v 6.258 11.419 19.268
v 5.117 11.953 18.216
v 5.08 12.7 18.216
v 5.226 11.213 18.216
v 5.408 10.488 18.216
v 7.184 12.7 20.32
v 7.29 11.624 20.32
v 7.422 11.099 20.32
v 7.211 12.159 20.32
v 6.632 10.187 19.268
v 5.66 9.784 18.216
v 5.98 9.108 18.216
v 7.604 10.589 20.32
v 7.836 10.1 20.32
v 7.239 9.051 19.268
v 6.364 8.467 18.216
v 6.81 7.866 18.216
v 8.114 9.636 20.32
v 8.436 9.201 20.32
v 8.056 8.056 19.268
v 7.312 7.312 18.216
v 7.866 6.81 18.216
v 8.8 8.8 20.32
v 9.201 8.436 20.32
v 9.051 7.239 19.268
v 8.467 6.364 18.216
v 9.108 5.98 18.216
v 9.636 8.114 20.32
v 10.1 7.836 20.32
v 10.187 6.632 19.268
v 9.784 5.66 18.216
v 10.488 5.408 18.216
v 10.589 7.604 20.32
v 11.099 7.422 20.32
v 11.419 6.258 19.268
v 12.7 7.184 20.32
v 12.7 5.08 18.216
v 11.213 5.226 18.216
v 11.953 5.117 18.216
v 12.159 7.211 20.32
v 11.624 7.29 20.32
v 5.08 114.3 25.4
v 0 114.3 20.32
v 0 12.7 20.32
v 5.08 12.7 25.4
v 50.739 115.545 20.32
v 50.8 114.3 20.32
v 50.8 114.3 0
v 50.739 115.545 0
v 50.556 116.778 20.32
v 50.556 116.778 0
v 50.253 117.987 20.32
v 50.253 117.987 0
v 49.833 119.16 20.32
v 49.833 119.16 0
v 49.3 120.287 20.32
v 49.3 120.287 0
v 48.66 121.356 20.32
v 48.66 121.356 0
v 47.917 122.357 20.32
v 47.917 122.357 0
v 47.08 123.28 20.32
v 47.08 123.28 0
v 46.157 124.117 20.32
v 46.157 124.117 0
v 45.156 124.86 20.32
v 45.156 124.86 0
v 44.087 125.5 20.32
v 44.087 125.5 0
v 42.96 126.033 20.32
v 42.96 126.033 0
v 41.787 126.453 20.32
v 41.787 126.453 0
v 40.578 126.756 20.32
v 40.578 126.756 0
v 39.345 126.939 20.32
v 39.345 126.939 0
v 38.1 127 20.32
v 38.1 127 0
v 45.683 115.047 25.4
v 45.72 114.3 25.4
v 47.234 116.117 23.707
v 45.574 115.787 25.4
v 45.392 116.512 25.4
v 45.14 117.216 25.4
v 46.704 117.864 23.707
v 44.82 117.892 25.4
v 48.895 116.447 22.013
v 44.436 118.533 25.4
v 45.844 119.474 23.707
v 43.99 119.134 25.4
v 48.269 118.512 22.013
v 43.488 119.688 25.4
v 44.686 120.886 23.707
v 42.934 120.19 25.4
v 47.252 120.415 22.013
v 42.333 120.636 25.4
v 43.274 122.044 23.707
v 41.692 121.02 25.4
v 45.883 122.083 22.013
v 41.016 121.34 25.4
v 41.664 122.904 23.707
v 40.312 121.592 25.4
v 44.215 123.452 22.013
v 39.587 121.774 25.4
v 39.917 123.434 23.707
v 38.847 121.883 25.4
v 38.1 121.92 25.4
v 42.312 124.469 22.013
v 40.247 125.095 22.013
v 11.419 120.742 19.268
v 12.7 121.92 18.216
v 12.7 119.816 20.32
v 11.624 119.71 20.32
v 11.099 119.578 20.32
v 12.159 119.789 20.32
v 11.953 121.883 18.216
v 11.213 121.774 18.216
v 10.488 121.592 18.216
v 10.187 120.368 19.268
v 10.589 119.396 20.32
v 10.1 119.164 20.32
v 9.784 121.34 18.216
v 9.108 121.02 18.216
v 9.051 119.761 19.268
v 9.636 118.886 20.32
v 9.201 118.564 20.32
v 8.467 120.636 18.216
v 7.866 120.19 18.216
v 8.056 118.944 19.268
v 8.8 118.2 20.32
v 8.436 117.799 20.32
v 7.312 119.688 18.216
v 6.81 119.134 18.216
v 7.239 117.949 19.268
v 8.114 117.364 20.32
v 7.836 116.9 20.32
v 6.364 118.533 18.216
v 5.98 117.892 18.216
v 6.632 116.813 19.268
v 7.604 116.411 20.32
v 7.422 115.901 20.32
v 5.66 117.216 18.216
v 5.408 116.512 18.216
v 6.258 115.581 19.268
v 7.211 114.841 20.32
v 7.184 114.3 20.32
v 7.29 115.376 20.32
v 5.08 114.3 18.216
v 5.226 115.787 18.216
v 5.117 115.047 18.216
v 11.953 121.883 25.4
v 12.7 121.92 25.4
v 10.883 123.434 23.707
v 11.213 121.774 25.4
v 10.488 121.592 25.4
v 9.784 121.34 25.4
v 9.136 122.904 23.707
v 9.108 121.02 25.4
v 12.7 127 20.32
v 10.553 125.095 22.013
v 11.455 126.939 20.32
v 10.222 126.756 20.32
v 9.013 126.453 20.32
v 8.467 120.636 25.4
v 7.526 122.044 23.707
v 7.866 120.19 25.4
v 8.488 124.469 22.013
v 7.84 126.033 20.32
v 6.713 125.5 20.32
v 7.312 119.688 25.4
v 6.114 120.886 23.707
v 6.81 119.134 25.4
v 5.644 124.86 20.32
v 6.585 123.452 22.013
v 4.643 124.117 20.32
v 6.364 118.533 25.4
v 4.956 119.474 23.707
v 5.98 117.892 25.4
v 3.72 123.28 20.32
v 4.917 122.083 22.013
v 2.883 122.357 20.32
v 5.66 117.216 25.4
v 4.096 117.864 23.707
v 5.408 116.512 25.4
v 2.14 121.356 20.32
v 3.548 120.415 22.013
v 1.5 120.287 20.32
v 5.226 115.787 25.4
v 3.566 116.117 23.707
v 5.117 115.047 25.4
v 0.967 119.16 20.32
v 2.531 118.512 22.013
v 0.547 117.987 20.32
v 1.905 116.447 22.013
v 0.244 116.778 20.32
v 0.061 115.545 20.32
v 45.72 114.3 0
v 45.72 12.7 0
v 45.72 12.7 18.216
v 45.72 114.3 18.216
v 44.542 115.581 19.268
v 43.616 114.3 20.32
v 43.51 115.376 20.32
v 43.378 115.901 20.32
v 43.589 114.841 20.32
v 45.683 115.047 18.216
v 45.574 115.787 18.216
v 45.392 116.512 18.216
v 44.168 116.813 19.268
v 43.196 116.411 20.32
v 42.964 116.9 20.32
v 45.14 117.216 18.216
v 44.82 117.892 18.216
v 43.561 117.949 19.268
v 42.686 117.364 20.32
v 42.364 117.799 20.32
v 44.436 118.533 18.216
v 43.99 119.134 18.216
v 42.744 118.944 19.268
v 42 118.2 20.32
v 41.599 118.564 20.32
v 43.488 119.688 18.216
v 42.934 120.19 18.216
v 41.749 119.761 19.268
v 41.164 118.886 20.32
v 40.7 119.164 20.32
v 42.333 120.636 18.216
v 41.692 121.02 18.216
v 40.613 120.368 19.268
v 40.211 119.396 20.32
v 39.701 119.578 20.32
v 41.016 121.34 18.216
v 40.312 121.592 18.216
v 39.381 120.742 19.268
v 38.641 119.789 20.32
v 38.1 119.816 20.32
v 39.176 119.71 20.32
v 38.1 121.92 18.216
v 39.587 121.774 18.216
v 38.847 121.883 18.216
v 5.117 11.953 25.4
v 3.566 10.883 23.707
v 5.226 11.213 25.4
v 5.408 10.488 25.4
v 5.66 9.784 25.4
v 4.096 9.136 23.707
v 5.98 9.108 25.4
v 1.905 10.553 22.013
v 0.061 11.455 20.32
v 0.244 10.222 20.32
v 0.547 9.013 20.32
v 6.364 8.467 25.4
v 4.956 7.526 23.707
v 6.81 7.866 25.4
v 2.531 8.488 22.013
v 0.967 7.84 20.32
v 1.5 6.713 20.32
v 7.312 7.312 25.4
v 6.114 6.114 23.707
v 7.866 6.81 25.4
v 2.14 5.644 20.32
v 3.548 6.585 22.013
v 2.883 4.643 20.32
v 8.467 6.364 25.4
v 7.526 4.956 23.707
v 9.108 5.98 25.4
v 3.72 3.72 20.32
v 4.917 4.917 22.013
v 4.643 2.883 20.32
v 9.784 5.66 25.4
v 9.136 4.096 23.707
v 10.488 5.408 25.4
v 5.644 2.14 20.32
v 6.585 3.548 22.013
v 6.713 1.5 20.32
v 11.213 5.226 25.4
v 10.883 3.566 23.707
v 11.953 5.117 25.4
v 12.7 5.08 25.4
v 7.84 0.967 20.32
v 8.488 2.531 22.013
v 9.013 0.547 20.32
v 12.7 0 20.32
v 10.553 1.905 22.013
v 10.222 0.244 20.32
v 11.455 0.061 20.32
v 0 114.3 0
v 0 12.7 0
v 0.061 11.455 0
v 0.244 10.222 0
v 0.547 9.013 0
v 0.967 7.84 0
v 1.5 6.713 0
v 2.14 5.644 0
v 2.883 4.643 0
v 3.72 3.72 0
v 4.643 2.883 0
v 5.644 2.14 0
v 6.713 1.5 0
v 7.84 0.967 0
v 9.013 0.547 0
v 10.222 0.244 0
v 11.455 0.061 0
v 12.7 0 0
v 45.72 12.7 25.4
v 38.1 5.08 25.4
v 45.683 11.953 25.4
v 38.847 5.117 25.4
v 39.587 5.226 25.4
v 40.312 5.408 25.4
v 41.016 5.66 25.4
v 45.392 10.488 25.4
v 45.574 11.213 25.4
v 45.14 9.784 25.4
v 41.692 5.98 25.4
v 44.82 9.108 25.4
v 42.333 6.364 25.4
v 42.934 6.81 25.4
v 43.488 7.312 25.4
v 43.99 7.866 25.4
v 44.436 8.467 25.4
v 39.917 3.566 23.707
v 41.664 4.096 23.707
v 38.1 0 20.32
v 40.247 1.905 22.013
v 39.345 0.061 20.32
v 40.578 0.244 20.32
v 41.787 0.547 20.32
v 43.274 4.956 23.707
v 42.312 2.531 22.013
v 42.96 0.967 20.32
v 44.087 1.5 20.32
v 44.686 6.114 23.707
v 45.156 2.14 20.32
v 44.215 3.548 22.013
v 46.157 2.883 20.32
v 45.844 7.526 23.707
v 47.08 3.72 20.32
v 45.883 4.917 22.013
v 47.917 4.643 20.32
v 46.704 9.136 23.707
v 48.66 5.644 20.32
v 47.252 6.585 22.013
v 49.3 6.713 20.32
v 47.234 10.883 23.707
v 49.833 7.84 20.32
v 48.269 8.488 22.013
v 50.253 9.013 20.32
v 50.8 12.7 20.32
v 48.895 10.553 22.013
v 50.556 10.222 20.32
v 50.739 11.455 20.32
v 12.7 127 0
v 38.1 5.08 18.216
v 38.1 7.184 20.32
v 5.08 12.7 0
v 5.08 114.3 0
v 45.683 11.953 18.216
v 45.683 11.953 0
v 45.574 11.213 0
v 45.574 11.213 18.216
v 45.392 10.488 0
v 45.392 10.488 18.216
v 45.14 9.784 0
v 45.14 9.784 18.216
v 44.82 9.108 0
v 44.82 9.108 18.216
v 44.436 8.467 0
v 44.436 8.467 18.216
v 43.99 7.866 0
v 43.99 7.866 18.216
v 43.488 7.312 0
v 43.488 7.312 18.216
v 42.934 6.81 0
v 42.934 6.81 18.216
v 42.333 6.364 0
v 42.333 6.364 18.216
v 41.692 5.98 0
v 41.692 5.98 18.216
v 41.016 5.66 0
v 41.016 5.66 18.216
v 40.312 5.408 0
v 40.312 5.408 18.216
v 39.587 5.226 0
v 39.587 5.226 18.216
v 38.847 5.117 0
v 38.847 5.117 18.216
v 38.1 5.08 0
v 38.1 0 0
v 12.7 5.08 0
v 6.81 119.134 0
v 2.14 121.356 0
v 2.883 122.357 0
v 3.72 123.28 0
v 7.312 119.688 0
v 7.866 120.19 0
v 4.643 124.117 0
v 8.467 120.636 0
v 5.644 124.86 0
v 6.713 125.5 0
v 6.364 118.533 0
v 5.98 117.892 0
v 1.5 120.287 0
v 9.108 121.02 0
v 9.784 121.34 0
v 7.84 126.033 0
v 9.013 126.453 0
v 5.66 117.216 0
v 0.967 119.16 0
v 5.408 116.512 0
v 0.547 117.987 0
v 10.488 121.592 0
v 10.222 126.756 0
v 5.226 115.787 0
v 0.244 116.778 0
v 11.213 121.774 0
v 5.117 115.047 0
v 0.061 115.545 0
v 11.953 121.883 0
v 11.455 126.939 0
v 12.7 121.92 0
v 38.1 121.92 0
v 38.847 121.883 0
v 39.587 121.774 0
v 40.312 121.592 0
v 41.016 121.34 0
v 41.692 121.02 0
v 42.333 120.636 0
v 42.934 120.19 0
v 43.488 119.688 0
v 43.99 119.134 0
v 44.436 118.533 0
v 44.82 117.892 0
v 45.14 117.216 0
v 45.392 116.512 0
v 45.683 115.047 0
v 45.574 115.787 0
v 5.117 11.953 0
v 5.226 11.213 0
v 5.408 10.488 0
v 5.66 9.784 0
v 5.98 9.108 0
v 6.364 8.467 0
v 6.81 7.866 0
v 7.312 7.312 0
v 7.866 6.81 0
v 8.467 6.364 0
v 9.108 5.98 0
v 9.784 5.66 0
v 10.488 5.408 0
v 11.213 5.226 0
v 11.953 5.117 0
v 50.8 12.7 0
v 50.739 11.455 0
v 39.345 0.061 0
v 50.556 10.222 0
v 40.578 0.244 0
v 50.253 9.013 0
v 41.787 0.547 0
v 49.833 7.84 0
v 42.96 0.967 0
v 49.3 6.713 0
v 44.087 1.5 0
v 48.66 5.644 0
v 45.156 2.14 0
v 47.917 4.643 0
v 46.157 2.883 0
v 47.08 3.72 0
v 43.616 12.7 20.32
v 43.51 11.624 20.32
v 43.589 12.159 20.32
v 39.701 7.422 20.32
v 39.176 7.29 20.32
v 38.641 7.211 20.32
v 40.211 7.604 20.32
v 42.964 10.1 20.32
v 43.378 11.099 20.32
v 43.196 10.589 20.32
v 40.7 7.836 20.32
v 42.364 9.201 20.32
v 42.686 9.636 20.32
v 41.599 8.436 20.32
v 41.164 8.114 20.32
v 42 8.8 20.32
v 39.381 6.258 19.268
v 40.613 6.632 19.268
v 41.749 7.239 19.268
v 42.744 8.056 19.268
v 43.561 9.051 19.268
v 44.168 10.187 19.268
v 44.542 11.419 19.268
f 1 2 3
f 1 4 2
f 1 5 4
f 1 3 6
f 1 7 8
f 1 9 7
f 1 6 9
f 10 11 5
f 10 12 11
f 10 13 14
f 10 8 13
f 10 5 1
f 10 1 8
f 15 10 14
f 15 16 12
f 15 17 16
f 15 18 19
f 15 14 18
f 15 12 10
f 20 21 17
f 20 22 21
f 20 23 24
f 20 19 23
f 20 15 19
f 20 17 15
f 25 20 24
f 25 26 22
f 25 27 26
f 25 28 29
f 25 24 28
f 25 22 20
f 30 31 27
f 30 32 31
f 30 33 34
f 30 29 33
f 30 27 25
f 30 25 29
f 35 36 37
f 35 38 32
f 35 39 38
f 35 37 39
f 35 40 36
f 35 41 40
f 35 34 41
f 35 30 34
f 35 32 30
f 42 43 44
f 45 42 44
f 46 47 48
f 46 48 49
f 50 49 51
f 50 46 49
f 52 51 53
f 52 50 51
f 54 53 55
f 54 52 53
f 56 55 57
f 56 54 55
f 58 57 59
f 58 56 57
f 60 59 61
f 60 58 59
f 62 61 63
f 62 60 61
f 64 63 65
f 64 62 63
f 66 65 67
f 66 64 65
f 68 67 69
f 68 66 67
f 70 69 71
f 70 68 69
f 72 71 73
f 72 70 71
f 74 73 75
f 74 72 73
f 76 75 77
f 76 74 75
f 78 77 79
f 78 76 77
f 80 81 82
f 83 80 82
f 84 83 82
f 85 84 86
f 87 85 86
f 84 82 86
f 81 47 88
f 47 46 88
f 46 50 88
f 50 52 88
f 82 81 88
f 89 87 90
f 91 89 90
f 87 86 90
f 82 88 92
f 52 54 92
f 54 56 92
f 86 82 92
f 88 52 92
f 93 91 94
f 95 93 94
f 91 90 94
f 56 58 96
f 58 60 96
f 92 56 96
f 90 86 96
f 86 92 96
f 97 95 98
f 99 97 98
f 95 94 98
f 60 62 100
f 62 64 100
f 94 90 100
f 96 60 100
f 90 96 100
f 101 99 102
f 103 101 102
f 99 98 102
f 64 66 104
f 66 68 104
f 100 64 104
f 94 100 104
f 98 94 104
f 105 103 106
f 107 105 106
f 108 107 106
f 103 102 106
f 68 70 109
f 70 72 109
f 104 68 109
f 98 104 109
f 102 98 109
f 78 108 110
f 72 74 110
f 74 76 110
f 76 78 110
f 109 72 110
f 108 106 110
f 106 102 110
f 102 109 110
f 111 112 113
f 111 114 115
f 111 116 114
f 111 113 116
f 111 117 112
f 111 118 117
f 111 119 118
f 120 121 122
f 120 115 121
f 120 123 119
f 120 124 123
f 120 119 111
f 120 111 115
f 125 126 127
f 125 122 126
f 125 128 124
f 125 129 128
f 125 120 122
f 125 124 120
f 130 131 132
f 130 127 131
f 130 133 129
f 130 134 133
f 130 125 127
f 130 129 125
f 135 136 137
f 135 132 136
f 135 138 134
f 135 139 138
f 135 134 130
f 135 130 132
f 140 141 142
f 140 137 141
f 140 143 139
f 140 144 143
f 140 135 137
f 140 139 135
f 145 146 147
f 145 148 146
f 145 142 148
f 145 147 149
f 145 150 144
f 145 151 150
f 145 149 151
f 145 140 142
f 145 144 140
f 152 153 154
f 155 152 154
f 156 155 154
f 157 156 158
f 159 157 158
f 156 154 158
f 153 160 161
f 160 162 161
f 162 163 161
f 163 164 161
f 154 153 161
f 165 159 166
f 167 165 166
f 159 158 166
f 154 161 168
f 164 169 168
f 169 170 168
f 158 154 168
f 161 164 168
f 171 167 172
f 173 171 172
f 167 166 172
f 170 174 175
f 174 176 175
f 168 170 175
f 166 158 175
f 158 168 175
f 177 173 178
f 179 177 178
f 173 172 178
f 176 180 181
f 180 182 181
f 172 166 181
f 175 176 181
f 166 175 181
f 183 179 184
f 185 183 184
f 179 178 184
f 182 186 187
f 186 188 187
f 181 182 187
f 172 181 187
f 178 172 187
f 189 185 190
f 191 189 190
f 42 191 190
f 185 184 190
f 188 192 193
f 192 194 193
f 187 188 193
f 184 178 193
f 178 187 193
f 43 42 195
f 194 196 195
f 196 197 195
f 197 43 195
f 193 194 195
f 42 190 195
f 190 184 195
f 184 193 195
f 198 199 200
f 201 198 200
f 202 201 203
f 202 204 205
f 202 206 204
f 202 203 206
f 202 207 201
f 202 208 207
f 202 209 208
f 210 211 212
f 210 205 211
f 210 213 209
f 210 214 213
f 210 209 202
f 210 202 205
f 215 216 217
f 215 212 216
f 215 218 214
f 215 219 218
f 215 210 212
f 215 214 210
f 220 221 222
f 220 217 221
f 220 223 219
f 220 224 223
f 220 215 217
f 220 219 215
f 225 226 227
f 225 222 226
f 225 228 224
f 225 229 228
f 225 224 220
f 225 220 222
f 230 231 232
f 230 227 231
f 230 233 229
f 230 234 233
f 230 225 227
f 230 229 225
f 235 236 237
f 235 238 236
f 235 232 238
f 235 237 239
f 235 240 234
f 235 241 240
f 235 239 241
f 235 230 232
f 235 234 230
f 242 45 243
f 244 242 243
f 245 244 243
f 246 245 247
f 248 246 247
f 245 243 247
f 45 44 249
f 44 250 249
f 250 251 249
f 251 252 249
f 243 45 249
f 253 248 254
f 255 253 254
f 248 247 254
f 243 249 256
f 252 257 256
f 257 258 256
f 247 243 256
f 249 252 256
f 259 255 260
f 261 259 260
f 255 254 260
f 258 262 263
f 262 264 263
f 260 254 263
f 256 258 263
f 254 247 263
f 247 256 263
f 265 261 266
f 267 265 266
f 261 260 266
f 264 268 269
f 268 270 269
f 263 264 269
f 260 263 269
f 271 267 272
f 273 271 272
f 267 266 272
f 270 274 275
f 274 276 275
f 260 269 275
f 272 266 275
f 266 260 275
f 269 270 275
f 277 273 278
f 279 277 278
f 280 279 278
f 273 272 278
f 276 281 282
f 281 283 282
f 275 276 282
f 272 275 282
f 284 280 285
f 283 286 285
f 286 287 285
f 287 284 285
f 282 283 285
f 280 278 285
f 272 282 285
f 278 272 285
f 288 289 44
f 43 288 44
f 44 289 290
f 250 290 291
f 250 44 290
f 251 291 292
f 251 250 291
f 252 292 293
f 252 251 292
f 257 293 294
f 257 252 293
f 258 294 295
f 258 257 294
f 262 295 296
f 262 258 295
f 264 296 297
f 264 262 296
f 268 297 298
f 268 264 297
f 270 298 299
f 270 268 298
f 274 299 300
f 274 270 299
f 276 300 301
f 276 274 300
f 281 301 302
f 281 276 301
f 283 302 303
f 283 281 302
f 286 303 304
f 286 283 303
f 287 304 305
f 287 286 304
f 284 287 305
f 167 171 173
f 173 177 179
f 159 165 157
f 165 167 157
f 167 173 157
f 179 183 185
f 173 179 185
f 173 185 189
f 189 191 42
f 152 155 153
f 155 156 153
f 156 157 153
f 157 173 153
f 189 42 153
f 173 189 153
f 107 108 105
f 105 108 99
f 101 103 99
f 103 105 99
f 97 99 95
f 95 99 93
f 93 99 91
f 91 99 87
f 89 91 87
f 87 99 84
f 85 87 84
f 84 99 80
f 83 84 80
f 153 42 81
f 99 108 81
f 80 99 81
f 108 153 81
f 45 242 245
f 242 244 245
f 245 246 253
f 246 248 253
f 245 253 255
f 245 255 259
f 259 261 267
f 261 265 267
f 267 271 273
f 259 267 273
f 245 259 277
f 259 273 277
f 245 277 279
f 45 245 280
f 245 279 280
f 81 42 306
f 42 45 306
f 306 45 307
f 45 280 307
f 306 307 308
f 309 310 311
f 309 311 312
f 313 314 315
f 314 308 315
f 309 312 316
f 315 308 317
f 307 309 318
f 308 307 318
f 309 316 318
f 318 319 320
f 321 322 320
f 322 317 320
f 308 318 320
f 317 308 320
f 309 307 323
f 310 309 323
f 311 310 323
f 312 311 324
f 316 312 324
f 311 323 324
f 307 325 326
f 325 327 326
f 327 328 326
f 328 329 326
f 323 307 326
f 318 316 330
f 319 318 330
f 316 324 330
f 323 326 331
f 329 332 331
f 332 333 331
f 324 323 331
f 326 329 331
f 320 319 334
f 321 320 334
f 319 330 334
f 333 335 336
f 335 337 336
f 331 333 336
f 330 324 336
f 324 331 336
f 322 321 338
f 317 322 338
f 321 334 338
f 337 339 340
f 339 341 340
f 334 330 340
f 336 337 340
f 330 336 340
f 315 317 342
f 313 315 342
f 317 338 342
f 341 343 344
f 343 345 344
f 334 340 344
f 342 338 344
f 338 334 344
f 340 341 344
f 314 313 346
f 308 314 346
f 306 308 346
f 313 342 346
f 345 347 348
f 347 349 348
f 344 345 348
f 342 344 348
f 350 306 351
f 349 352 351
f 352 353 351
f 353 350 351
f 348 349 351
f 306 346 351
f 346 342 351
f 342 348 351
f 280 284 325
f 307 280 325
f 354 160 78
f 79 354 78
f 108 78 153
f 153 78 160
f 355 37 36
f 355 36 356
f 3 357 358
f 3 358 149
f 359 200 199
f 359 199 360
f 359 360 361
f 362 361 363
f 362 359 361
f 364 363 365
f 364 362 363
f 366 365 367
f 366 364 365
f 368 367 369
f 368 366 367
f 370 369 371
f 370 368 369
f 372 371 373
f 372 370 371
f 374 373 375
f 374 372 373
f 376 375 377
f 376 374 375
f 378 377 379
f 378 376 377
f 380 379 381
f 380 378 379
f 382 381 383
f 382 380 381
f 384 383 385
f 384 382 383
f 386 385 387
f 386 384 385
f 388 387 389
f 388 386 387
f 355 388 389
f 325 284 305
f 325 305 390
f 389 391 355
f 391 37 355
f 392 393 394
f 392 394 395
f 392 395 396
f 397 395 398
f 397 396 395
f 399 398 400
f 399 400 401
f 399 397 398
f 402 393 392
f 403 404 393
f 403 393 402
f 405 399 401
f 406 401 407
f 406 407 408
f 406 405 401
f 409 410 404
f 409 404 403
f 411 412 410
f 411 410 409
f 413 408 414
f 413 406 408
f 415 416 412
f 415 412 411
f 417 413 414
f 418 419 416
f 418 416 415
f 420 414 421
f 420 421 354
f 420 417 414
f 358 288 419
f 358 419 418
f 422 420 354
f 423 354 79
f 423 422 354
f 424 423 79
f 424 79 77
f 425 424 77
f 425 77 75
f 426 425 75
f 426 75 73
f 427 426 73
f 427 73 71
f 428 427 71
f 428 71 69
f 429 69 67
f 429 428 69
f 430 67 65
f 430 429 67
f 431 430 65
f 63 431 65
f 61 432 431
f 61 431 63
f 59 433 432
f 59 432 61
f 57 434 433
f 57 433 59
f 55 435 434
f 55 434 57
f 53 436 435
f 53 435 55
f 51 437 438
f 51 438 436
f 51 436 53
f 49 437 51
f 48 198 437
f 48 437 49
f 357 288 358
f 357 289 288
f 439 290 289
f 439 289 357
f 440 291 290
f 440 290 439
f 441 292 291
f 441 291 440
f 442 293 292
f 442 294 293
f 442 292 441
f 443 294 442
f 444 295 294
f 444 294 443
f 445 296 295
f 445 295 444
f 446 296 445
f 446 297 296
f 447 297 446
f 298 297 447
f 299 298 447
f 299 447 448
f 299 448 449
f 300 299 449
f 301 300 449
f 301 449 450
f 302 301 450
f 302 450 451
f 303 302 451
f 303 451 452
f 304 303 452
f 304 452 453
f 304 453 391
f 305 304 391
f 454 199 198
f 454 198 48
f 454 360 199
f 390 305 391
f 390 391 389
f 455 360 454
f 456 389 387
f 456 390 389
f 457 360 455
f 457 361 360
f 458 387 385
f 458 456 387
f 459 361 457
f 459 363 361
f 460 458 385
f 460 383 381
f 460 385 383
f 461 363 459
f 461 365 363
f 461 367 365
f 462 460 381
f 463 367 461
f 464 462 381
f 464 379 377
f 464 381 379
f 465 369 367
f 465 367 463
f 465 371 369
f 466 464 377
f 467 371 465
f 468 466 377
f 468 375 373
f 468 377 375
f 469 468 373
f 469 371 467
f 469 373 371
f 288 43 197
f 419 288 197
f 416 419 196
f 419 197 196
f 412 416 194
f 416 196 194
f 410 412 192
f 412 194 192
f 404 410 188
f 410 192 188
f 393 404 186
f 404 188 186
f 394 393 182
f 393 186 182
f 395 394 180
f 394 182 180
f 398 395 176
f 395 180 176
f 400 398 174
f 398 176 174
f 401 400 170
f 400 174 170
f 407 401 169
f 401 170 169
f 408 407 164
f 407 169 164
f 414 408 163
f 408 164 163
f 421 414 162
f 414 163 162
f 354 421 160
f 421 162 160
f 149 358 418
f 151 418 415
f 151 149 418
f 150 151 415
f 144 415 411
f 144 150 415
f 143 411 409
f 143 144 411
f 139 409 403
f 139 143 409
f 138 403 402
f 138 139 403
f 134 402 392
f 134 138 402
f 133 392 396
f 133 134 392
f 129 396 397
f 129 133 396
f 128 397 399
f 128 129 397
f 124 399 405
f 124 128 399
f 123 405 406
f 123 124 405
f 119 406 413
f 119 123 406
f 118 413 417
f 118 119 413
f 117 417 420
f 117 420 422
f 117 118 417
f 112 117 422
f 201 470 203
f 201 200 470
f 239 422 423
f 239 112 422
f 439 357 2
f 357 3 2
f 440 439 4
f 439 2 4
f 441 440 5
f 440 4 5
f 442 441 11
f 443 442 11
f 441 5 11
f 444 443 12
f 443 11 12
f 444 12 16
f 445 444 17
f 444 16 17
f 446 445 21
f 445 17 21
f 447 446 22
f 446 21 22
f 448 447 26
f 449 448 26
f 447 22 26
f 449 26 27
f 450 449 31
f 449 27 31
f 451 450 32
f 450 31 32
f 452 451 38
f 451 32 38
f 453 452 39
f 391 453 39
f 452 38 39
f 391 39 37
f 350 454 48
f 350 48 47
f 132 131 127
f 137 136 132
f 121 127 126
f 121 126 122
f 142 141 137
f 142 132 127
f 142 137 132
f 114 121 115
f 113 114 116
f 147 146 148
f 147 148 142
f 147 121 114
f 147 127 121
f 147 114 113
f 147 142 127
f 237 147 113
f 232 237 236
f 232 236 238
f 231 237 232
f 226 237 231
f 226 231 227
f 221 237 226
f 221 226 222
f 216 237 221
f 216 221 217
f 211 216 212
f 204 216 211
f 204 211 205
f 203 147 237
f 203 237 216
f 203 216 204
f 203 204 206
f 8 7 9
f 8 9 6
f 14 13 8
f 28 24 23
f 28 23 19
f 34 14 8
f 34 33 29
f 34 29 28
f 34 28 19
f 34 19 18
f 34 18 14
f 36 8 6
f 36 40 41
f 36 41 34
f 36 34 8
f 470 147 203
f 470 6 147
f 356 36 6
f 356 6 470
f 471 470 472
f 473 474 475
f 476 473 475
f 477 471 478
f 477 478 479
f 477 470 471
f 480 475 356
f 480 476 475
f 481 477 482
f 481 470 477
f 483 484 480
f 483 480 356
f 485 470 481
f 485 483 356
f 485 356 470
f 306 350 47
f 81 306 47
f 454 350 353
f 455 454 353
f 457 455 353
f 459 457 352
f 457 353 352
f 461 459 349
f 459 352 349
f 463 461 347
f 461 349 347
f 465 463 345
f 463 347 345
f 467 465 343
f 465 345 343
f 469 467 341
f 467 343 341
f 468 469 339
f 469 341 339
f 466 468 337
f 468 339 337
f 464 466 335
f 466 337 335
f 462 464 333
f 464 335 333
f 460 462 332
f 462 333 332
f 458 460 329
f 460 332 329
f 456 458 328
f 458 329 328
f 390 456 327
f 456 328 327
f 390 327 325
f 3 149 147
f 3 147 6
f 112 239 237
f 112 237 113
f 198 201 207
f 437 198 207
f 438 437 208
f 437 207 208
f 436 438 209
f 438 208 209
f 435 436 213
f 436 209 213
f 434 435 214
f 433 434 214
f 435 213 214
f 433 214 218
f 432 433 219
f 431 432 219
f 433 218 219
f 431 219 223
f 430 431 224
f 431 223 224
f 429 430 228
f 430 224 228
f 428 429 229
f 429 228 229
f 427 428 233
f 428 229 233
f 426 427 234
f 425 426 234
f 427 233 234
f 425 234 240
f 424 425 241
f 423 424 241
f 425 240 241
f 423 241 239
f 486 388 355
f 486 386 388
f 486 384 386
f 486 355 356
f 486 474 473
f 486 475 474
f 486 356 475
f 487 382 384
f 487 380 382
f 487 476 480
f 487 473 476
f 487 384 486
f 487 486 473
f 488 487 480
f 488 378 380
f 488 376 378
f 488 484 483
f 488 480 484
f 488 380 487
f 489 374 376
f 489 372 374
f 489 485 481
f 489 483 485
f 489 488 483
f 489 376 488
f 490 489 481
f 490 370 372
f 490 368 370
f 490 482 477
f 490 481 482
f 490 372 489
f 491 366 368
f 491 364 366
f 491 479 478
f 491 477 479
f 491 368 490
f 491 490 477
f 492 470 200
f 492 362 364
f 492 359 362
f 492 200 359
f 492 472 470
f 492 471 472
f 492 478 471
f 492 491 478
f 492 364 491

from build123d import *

# Parameters (mm, degrees)
F0_W     = 50.8
F0_H     = 25.4
F1_DEPTH = 127
F2_R     = 12.7
F3_SIZE  = 5.08
F4_T     = -5.08


with BuildPart() as f1:
    # F0 (on Front) → F1 (new body)
    with BuildSketch(Plane.XZ):
        with Locations((25.4, 12.7)):
            Rectangle(F0_W, F0_H)
    extrude(amount=-F1_DEPTH)

    # F2
    f2_edges = [f1.edges().sort_by_distance(p)[0] for p in [
        (0, 0, 12.7),
        (50.8, 0, 12.7),
        (50.8, 127, 12.7),
        (0, 127, 12.7),
    ]]
    fillet(f2_edges, radius=F2_R)

    # F3
    f3_edges = [f1.edges().sort_by_distance(p)[0] for p in [
        (50.8, 63.5, 25.4),
    ]]
    chamfer(f3_edges, length=F3_SIZE)

    # F4
    f4_openings = [f1.faces().sort_by_distance(p)[0] for p in [
        (25.4, 63.5, 0),
    ]]
    offset(amount=F4_T, openings=f4_openings)


solid = f1.part
